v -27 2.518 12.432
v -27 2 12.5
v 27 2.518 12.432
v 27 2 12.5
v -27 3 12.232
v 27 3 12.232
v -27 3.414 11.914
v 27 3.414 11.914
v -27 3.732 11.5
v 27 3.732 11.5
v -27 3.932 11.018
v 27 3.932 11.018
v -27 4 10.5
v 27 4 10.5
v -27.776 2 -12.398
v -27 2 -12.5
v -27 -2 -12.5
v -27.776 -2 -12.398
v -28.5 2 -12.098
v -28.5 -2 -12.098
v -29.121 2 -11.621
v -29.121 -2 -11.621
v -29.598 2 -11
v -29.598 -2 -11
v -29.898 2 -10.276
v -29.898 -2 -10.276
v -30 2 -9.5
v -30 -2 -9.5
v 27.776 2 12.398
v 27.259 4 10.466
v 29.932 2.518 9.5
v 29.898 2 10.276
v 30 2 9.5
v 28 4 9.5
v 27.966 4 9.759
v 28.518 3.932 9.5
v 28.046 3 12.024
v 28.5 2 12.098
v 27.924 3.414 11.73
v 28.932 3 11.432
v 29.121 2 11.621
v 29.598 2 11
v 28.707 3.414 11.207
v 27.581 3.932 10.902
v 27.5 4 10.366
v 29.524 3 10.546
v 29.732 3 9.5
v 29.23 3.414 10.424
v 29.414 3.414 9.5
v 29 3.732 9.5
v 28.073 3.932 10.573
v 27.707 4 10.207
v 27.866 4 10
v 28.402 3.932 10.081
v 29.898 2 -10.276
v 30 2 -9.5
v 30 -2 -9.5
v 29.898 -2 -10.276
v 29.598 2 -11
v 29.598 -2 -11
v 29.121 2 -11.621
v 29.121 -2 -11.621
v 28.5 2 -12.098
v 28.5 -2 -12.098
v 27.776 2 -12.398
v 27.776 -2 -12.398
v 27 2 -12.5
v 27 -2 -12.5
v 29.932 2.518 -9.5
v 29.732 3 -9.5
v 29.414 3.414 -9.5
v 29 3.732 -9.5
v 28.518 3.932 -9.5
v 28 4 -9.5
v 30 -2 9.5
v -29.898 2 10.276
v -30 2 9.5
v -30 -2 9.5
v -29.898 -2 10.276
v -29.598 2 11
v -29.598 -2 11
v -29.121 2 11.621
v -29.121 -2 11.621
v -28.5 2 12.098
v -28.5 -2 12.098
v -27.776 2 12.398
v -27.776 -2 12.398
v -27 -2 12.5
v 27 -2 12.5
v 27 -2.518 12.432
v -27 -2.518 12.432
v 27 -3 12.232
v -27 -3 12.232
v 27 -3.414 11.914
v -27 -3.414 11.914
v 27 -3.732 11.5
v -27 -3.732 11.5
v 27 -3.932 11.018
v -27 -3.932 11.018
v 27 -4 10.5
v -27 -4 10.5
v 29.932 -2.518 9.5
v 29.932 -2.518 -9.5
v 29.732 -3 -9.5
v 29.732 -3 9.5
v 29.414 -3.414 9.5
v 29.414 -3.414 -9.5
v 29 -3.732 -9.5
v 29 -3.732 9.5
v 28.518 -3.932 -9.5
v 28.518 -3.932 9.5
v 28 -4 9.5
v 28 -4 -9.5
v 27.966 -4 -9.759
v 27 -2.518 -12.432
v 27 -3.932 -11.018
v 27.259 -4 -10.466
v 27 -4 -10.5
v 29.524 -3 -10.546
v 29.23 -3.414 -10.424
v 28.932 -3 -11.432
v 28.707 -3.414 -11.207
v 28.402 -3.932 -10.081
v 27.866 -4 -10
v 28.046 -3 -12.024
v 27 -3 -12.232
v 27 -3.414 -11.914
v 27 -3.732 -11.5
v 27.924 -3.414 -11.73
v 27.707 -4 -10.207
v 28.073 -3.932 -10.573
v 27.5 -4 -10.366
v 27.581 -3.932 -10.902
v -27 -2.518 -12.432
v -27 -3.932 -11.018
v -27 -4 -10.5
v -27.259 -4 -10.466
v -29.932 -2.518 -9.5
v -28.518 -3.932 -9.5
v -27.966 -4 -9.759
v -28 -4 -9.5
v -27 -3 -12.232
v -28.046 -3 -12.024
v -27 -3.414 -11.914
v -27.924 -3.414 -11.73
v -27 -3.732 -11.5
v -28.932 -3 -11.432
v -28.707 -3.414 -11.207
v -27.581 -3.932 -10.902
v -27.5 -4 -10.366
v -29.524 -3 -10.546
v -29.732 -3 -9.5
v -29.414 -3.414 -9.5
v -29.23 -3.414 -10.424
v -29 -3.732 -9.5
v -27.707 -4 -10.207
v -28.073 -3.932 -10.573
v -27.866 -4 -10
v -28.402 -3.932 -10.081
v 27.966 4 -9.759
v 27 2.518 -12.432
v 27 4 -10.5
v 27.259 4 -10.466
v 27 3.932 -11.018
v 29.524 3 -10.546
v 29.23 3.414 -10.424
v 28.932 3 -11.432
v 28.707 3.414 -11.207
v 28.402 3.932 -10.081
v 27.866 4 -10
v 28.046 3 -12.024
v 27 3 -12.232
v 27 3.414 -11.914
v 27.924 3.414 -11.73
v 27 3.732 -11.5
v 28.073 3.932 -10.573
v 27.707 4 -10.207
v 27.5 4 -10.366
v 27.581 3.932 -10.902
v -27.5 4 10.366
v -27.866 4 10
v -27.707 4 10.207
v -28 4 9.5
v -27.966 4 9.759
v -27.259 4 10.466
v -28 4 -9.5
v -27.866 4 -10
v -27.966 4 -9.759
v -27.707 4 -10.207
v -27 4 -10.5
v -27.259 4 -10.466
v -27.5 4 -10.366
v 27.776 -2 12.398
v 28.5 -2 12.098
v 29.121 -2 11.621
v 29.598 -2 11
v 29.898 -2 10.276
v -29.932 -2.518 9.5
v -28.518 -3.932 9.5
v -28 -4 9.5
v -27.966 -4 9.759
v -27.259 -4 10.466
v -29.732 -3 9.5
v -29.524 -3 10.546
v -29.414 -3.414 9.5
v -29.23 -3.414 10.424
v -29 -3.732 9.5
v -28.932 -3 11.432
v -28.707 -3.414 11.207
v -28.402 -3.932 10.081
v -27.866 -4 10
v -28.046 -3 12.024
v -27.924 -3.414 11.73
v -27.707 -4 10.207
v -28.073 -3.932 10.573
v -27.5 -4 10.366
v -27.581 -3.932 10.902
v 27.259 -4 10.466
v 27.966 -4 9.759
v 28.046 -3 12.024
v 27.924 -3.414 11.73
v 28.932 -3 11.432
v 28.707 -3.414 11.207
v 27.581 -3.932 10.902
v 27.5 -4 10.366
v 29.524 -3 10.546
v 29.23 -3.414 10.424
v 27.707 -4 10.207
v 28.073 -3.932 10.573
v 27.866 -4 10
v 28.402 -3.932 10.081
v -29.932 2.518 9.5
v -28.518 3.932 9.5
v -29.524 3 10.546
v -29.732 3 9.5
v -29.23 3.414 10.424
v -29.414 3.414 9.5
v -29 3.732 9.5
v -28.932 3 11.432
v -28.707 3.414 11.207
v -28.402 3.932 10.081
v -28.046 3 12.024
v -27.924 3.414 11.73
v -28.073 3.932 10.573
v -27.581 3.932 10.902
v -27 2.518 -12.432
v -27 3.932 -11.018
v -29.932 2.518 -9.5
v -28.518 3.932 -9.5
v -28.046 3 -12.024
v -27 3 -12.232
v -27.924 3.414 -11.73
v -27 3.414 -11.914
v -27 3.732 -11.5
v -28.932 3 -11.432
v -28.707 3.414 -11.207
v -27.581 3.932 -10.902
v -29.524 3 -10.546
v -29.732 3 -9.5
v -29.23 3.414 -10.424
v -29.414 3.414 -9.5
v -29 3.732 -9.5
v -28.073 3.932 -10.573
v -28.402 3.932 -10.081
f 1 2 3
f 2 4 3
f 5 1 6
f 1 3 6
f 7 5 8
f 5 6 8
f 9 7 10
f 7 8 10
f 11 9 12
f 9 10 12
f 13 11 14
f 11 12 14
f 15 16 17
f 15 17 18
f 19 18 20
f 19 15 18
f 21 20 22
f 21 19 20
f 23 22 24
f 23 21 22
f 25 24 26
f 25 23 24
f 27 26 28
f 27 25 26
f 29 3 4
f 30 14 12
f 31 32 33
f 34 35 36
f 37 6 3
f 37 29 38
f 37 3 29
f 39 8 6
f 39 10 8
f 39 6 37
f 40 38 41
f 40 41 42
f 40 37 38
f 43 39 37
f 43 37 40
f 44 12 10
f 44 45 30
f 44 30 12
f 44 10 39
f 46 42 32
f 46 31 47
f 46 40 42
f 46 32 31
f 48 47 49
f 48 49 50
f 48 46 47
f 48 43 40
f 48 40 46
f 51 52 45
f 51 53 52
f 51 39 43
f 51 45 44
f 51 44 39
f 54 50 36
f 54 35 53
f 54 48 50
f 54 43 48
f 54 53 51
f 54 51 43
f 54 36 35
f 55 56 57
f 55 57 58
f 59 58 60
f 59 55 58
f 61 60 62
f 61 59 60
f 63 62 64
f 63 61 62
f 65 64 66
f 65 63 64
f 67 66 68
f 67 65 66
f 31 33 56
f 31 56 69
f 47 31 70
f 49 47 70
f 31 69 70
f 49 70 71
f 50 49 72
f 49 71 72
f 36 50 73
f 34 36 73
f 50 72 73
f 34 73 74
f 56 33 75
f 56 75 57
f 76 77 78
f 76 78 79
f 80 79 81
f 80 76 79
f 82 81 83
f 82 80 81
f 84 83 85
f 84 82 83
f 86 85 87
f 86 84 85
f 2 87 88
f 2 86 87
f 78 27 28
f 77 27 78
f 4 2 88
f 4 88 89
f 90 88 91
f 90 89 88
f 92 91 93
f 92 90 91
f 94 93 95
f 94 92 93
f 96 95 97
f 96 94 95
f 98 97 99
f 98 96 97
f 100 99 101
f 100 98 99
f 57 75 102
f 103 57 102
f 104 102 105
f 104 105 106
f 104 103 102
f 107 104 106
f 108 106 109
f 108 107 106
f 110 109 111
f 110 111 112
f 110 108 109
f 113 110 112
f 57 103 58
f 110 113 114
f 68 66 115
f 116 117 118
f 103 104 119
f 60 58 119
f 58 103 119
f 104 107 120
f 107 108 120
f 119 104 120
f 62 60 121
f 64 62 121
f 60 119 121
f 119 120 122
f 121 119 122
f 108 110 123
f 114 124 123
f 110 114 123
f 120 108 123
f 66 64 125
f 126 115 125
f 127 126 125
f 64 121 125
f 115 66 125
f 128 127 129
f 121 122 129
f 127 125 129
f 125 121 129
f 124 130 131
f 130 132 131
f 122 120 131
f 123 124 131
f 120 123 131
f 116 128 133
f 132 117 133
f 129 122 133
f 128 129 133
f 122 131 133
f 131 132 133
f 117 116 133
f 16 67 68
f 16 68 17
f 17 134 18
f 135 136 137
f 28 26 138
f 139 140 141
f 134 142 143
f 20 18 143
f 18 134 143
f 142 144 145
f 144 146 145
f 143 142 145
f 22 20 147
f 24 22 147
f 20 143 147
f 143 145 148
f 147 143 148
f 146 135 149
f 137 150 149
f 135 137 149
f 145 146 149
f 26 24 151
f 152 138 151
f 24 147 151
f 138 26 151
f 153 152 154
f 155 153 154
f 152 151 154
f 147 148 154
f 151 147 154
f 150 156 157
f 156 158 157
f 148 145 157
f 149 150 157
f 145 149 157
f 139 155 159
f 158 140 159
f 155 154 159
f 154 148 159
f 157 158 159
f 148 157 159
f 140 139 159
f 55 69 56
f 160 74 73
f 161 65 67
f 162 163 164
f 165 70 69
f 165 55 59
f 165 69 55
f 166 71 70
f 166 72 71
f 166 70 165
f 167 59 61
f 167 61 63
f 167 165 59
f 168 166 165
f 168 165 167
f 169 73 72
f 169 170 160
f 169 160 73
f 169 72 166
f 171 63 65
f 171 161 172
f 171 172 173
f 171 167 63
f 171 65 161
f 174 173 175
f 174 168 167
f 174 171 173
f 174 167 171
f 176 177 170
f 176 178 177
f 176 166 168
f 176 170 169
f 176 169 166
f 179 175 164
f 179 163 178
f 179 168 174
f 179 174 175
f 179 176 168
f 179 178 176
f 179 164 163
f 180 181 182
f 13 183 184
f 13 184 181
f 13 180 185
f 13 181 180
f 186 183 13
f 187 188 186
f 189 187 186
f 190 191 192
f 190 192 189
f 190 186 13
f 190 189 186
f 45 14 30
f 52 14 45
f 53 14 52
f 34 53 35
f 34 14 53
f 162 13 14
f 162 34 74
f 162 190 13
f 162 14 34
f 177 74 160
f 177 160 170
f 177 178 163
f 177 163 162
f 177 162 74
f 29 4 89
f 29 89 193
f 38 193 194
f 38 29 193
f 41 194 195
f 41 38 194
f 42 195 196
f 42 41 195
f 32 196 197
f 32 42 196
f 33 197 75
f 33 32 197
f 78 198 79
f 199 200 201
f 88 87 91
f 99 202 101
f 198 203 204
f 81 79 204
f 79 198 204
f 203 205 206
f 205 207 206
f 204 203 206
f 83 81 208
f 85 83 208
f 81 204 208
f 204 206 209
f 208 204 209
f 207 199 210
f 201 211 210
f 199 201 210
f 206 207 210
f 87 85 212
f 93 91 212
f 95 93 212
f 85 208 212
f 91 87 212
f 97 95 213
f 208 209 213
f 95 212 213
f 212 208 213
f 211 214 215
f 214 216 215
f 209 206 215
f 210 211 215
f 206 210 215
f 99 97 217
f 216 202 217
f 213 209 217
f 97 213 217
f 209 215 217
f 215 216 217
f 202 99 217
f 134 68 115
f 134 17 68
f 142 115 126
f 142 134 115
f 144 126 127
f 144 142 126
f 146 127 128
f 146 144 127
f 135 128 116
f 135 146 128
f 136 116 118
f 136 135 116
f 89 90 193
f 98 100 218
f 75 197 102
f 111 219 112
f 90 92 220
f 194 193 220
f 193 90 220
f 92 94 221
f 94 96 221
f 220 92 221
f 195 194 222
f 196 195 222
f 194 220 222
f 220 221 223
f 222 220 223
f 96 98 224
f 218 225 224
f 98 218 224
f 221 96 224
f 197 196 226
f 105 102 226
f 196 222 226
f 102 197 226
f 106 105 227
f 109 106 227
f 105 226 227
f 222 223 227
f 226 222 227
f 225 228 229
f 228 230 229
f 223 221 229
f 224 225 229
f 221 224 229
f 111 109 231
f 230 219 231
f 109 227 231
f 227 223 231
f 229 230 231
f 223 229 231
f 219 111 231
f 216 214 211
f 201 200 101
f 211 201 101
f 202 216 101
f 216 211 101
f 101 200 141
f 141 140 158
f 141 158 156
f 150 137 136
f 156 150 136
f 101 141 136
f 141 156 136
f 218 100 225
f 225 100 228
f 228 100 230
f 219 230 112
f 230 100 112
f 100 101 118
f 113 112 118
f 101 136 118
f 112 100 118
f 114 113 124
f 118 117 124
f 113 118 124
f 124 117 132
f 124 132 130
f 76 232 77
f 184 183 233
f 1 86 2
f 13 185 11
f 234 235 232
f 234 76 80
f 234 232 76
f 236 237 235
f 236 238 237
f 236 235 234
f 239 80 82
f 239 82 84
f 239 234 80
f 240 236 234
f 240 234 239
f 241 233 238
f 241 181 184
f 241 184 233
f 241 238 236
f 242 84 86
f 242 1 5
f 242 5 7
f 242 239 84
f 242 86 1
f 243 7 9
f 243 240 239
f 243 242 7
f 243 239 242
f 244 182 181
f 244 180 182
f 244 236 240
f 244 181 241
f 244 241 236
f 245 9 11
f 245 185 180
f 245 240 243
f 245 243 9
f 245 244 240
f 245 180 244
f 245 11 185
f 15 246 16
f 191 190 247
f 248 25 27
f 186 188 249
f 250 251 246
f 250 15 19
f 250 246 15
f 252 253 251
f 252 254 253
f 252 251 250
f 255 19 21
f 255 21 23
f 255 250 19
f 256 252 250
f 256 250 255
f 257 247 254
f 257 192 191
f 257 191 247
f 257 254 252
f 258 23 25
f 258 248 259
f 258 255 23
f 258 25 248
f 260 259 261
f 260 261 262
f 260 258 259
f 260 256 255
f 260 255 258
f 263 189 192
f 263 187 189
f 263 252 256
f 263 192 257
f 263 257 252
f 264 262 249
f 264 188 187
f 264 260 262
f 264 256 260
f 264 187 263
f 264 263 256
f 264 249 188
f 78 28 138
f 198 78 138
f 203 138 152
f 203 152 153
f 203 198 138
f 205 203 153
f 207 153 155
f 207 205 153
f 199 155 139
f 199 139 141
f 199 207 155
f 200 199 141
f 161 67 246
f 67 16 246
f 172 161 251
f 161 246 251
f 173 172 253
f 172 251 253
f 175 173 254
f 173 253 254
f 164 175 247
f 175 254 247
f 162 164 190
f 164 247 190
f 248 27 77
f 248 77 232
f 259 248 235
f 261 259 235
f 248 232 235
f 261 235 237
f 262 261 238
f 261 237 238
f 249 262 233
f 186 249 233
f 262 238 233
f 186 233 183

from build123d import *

# Parameters (mm, degrees)
EXTRUDE_1_DEPTH = 4
FILLET_1_R      = 2


with BuildPart() as part:
    # 草图1 → 凸台-拉伸1 (new, symmetric)
    with BuildSketch(Plane(origin=(0, 0, 0), x_dir=(1, 0, 0), z_dir=(0, 1, 0))):
        with BuildLine():
            Line((-27, -12.5), (27, -12.5))
            ThreePointArc((27, -12.5), (29.121320344, -11.621320344), (30, -9.5))
            Line((30, -9.5), (30, 9.5))
            ThreePointArc((30, 9.5), (29.121320344, 11.621320344), (27, 12.5))
            Line((27, 12.5), (-27, 12.5))
            ThreePointArc((-27, 12.5), (-29.121320344, 11.621320344), (-30, 9.5))
            Line((-30, 9.5), (-30, -9.5))
            ThreePointArc((-30, -9.5), (-29.121320344, -11.621320344), (-27, -12.5))
        make_face()
    extrude(amount=EXTRUDE_1_DEPTH, both=True)

    # 圆角1
    fillet_1_edges = [part.edges().sort_by_distance(p)[0] for p in [
        (0, -4, -12.5),
        (29.121320344, -4, -11.621320344),
        (30, -4, 0),
        (29.121320344, -4, 11.621320344),
        (29.121320344, 4, -11.621320344),
        (0, 4, -12.5),
        (-29.121320344, 4, -11.621320344),
        (-30, 4, 0),
        (-29.121320344, 4, 11.621320344),
        (0, 4, 12.5),
        (29.121320344, 4, 11.621320344),
        (0, -4, 12.5),
        (30, 4, 0),
        (-29.121320344, -4, 11.621320344),
        (-30, -4, 0),
        (-29.121320344, -4, -11.621320344),
    ]]
    fillet(fillet_1_edges, radius=FILLET_1_R)


solid = part.part
